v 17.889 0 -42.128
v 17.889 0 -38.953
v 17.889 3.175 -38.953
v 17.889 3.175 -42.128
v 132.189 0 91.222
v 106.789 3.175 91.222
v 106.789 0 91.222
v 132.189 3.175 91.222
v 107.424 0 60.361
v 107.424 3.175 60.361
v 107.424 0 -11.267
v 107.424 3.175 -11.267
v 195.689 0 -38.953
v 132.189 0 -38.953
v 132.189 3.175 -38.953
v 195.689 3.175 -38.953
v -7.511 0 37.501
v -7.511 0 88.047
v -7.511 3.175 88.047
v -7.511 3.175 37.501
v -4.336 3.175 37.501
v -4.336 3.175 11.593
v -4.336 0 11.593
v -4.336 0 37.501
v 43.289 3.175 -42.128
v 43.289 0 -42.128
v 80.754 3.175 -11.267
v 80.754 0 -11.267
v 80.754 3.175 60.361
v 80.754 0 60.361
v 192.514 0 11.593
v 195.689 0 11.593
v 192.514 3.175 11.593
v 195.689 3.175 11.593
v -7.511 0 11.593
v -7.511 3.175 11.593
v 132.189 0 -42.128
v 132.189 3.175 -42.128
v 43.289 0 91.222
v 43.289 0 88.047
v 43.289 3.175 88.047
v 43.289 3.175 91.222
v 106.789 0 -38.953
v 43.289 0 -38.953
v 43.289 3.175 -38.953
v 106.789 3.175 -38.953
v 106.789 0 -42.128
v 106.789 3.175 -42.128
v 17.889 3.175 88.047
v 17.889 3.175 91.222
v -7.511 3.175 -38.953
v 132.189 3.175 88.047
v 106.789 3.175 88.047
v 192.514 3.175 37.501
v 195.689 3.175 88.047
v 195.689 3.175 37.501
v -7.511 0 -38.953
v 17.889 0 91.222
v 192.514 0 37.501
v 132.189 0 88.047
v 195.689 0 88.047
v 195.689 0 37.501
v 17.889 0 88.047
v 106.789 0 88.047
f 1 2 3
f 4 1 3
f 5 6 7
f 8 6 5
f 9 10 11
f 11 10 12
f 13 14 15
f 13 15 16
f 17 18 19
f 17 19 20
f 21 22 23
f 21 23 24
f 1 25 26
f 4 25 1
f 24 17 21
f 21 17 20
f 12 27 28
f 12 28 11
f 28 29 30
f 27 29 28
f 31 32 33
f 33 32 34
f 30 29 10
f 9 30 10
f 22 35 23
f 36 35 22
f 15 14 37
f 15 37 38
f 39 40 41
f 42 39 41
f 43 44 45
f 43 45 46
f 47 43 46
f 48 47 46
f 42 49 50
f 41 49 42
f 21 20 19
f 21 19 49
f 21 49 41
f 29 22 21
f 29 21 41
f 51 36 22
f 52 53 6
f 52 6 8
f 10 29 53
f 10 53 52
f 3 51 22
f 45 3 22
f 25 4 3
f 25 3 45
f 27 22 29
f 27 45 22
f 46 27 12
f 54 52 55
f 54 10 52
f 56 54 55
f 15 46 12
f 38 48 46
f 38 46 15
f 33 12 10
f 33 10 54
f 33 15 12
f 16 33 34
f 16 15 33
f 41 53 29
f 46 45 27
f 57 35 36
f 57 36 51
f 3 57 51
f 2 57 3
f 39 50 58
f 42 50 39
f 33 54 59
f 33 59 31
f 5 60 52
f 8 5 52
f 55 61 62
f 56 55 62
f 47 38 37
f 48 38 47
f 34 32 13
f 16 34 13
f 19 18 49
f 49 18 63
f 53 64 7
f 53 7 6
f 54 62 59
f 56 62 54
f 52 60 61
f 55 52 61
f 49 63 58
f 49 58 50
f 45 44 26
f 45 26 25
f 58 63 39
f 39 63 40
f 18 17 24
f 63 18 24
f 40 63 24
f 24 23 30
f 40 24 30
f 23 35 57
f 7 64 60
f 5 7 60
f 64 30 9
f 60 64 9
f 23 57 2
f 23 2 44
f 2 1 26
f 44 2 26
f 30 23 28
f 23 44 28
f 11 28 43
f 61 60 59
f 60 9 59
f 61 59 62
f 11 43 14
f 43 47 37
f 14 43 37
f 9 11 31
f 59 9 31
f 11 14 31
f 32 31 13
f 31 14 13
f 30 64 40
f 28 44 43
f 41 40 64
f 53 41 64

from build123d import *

# Parameters (mm, degrees)
SKETCH1_W           = 203.2
SKETCH1_H           = 127
BOSS_EXTRUDE1_DEPTH = 3.175
SKETCH2_W           = 25.4
SKETCH2_H           = 3.175
BOSS_EXTRUDE2_DEPTH = 3.175
SKETCH3_W           = 25.4
SKETCH3_H           = 3.175
BOSS_EXTRUDE3_DEPTH = 3.175
SKETCH4_W           = 25.908
SKETCH4_H           = 3.175
CUT_EXTRUDE1_DEPTH  = 3.175
SKETCH5_W           = 25.908
SKETCH5_H           = 3.175
CUT_EXTRUDE2_DEPTH  = 3.175
SKETCH7_W           = 26.67
SKETCH7_H           = 71.628
CUT_EXTRUDE3_DEPTH  = 3.175


with BuildPart() as part:
    # Sketch1 → Boss-Extrude1 (new body)
    with BuildSketch(Plane(origin=(0, 0, 0), x_dir=(1, 0, 0), z_dir=(0, 1, 0))):
        with Locations((94.089247312, -24.546505376)):
            Rectangle(SKETCH1_W, SKETCH1_H)
    extrude(amount=BOSS_EXTRUDE1_DEPTH)

    # Sketch2 → Boss-Extrude2 (add)
    with BuildSketch(Plane.XY.offset(88.046505376)):
        with Locations((119.489247312, 1.5875)):
            Rectangle(SKETCH2_W, SKETCH2_H)
        with Locations((30.589247312, 1.5875)):
            Rectangle(SKETCH2_W, SKETCH2_H)
    extrude(amount=BOSS_EXTRUDE2_DEPTH)

    # Sketch3 → Boss-Extrude3 (add)
    with BuildSketch(Plane(origin=(0, 0, -38.953494624), x_dir=(-1, 0, 0), z_dir=(0, 0, -1))):
        with Locations((-119.489247312, 1.5875)):
            Rectangle(SKETCH3_W, SKETCH3_H)
        with Locations((-30.589247312, 1.5875)):
            Rectangle(SKETCH3_W, SKETCH3_H)
    extrude(amount=BOSS_EXTRUDE3_DEPTH)

    # Sketch4 → Cut-Extrude1 (cut)
    with BuildSketch(Plane(origin=(195.689247312, 0, 0), x_dir=(0, 0, -1), z_dir=(1, 0, 0))):
        with Locations((-24.546505376, 1.5875)):
            Rectangle(SKETCH4_W, SKETCH4_H)
    extrude(amount=-CUT_EXTRUDE1_DEPTH, mode=Mode.SUBTRACT)

    # Sketch5 → Cut-Extrude2 (cut)
    with BuildSketch(Plane.ZY.offset(7.510752688)):
        with Locations((24.546505376, 1.5875)):
            Rectangle(SKETCH5_W, SKETCH5_H)
    extrude(amount=-CUT_EXTRUDE2_DEPTH, mode=Mode.SUBTRACT)

    # Sketch7 → Cut-Extrude3 (cut)
    with BuildSketch(Plane(origin=(0, 3.175, 0), x_dir=(1, 0, 0), z_dir=(0, 1, 0))):
        with Locations((94.089247312, -24.546505376)):
            Rectangle(SKETCH7_W, SKETCH7_H)
    extrude(amount=-CUT_EXTRUDE3_DEPTH, mode=Mode.SUBTRACT)


solid = part.part
